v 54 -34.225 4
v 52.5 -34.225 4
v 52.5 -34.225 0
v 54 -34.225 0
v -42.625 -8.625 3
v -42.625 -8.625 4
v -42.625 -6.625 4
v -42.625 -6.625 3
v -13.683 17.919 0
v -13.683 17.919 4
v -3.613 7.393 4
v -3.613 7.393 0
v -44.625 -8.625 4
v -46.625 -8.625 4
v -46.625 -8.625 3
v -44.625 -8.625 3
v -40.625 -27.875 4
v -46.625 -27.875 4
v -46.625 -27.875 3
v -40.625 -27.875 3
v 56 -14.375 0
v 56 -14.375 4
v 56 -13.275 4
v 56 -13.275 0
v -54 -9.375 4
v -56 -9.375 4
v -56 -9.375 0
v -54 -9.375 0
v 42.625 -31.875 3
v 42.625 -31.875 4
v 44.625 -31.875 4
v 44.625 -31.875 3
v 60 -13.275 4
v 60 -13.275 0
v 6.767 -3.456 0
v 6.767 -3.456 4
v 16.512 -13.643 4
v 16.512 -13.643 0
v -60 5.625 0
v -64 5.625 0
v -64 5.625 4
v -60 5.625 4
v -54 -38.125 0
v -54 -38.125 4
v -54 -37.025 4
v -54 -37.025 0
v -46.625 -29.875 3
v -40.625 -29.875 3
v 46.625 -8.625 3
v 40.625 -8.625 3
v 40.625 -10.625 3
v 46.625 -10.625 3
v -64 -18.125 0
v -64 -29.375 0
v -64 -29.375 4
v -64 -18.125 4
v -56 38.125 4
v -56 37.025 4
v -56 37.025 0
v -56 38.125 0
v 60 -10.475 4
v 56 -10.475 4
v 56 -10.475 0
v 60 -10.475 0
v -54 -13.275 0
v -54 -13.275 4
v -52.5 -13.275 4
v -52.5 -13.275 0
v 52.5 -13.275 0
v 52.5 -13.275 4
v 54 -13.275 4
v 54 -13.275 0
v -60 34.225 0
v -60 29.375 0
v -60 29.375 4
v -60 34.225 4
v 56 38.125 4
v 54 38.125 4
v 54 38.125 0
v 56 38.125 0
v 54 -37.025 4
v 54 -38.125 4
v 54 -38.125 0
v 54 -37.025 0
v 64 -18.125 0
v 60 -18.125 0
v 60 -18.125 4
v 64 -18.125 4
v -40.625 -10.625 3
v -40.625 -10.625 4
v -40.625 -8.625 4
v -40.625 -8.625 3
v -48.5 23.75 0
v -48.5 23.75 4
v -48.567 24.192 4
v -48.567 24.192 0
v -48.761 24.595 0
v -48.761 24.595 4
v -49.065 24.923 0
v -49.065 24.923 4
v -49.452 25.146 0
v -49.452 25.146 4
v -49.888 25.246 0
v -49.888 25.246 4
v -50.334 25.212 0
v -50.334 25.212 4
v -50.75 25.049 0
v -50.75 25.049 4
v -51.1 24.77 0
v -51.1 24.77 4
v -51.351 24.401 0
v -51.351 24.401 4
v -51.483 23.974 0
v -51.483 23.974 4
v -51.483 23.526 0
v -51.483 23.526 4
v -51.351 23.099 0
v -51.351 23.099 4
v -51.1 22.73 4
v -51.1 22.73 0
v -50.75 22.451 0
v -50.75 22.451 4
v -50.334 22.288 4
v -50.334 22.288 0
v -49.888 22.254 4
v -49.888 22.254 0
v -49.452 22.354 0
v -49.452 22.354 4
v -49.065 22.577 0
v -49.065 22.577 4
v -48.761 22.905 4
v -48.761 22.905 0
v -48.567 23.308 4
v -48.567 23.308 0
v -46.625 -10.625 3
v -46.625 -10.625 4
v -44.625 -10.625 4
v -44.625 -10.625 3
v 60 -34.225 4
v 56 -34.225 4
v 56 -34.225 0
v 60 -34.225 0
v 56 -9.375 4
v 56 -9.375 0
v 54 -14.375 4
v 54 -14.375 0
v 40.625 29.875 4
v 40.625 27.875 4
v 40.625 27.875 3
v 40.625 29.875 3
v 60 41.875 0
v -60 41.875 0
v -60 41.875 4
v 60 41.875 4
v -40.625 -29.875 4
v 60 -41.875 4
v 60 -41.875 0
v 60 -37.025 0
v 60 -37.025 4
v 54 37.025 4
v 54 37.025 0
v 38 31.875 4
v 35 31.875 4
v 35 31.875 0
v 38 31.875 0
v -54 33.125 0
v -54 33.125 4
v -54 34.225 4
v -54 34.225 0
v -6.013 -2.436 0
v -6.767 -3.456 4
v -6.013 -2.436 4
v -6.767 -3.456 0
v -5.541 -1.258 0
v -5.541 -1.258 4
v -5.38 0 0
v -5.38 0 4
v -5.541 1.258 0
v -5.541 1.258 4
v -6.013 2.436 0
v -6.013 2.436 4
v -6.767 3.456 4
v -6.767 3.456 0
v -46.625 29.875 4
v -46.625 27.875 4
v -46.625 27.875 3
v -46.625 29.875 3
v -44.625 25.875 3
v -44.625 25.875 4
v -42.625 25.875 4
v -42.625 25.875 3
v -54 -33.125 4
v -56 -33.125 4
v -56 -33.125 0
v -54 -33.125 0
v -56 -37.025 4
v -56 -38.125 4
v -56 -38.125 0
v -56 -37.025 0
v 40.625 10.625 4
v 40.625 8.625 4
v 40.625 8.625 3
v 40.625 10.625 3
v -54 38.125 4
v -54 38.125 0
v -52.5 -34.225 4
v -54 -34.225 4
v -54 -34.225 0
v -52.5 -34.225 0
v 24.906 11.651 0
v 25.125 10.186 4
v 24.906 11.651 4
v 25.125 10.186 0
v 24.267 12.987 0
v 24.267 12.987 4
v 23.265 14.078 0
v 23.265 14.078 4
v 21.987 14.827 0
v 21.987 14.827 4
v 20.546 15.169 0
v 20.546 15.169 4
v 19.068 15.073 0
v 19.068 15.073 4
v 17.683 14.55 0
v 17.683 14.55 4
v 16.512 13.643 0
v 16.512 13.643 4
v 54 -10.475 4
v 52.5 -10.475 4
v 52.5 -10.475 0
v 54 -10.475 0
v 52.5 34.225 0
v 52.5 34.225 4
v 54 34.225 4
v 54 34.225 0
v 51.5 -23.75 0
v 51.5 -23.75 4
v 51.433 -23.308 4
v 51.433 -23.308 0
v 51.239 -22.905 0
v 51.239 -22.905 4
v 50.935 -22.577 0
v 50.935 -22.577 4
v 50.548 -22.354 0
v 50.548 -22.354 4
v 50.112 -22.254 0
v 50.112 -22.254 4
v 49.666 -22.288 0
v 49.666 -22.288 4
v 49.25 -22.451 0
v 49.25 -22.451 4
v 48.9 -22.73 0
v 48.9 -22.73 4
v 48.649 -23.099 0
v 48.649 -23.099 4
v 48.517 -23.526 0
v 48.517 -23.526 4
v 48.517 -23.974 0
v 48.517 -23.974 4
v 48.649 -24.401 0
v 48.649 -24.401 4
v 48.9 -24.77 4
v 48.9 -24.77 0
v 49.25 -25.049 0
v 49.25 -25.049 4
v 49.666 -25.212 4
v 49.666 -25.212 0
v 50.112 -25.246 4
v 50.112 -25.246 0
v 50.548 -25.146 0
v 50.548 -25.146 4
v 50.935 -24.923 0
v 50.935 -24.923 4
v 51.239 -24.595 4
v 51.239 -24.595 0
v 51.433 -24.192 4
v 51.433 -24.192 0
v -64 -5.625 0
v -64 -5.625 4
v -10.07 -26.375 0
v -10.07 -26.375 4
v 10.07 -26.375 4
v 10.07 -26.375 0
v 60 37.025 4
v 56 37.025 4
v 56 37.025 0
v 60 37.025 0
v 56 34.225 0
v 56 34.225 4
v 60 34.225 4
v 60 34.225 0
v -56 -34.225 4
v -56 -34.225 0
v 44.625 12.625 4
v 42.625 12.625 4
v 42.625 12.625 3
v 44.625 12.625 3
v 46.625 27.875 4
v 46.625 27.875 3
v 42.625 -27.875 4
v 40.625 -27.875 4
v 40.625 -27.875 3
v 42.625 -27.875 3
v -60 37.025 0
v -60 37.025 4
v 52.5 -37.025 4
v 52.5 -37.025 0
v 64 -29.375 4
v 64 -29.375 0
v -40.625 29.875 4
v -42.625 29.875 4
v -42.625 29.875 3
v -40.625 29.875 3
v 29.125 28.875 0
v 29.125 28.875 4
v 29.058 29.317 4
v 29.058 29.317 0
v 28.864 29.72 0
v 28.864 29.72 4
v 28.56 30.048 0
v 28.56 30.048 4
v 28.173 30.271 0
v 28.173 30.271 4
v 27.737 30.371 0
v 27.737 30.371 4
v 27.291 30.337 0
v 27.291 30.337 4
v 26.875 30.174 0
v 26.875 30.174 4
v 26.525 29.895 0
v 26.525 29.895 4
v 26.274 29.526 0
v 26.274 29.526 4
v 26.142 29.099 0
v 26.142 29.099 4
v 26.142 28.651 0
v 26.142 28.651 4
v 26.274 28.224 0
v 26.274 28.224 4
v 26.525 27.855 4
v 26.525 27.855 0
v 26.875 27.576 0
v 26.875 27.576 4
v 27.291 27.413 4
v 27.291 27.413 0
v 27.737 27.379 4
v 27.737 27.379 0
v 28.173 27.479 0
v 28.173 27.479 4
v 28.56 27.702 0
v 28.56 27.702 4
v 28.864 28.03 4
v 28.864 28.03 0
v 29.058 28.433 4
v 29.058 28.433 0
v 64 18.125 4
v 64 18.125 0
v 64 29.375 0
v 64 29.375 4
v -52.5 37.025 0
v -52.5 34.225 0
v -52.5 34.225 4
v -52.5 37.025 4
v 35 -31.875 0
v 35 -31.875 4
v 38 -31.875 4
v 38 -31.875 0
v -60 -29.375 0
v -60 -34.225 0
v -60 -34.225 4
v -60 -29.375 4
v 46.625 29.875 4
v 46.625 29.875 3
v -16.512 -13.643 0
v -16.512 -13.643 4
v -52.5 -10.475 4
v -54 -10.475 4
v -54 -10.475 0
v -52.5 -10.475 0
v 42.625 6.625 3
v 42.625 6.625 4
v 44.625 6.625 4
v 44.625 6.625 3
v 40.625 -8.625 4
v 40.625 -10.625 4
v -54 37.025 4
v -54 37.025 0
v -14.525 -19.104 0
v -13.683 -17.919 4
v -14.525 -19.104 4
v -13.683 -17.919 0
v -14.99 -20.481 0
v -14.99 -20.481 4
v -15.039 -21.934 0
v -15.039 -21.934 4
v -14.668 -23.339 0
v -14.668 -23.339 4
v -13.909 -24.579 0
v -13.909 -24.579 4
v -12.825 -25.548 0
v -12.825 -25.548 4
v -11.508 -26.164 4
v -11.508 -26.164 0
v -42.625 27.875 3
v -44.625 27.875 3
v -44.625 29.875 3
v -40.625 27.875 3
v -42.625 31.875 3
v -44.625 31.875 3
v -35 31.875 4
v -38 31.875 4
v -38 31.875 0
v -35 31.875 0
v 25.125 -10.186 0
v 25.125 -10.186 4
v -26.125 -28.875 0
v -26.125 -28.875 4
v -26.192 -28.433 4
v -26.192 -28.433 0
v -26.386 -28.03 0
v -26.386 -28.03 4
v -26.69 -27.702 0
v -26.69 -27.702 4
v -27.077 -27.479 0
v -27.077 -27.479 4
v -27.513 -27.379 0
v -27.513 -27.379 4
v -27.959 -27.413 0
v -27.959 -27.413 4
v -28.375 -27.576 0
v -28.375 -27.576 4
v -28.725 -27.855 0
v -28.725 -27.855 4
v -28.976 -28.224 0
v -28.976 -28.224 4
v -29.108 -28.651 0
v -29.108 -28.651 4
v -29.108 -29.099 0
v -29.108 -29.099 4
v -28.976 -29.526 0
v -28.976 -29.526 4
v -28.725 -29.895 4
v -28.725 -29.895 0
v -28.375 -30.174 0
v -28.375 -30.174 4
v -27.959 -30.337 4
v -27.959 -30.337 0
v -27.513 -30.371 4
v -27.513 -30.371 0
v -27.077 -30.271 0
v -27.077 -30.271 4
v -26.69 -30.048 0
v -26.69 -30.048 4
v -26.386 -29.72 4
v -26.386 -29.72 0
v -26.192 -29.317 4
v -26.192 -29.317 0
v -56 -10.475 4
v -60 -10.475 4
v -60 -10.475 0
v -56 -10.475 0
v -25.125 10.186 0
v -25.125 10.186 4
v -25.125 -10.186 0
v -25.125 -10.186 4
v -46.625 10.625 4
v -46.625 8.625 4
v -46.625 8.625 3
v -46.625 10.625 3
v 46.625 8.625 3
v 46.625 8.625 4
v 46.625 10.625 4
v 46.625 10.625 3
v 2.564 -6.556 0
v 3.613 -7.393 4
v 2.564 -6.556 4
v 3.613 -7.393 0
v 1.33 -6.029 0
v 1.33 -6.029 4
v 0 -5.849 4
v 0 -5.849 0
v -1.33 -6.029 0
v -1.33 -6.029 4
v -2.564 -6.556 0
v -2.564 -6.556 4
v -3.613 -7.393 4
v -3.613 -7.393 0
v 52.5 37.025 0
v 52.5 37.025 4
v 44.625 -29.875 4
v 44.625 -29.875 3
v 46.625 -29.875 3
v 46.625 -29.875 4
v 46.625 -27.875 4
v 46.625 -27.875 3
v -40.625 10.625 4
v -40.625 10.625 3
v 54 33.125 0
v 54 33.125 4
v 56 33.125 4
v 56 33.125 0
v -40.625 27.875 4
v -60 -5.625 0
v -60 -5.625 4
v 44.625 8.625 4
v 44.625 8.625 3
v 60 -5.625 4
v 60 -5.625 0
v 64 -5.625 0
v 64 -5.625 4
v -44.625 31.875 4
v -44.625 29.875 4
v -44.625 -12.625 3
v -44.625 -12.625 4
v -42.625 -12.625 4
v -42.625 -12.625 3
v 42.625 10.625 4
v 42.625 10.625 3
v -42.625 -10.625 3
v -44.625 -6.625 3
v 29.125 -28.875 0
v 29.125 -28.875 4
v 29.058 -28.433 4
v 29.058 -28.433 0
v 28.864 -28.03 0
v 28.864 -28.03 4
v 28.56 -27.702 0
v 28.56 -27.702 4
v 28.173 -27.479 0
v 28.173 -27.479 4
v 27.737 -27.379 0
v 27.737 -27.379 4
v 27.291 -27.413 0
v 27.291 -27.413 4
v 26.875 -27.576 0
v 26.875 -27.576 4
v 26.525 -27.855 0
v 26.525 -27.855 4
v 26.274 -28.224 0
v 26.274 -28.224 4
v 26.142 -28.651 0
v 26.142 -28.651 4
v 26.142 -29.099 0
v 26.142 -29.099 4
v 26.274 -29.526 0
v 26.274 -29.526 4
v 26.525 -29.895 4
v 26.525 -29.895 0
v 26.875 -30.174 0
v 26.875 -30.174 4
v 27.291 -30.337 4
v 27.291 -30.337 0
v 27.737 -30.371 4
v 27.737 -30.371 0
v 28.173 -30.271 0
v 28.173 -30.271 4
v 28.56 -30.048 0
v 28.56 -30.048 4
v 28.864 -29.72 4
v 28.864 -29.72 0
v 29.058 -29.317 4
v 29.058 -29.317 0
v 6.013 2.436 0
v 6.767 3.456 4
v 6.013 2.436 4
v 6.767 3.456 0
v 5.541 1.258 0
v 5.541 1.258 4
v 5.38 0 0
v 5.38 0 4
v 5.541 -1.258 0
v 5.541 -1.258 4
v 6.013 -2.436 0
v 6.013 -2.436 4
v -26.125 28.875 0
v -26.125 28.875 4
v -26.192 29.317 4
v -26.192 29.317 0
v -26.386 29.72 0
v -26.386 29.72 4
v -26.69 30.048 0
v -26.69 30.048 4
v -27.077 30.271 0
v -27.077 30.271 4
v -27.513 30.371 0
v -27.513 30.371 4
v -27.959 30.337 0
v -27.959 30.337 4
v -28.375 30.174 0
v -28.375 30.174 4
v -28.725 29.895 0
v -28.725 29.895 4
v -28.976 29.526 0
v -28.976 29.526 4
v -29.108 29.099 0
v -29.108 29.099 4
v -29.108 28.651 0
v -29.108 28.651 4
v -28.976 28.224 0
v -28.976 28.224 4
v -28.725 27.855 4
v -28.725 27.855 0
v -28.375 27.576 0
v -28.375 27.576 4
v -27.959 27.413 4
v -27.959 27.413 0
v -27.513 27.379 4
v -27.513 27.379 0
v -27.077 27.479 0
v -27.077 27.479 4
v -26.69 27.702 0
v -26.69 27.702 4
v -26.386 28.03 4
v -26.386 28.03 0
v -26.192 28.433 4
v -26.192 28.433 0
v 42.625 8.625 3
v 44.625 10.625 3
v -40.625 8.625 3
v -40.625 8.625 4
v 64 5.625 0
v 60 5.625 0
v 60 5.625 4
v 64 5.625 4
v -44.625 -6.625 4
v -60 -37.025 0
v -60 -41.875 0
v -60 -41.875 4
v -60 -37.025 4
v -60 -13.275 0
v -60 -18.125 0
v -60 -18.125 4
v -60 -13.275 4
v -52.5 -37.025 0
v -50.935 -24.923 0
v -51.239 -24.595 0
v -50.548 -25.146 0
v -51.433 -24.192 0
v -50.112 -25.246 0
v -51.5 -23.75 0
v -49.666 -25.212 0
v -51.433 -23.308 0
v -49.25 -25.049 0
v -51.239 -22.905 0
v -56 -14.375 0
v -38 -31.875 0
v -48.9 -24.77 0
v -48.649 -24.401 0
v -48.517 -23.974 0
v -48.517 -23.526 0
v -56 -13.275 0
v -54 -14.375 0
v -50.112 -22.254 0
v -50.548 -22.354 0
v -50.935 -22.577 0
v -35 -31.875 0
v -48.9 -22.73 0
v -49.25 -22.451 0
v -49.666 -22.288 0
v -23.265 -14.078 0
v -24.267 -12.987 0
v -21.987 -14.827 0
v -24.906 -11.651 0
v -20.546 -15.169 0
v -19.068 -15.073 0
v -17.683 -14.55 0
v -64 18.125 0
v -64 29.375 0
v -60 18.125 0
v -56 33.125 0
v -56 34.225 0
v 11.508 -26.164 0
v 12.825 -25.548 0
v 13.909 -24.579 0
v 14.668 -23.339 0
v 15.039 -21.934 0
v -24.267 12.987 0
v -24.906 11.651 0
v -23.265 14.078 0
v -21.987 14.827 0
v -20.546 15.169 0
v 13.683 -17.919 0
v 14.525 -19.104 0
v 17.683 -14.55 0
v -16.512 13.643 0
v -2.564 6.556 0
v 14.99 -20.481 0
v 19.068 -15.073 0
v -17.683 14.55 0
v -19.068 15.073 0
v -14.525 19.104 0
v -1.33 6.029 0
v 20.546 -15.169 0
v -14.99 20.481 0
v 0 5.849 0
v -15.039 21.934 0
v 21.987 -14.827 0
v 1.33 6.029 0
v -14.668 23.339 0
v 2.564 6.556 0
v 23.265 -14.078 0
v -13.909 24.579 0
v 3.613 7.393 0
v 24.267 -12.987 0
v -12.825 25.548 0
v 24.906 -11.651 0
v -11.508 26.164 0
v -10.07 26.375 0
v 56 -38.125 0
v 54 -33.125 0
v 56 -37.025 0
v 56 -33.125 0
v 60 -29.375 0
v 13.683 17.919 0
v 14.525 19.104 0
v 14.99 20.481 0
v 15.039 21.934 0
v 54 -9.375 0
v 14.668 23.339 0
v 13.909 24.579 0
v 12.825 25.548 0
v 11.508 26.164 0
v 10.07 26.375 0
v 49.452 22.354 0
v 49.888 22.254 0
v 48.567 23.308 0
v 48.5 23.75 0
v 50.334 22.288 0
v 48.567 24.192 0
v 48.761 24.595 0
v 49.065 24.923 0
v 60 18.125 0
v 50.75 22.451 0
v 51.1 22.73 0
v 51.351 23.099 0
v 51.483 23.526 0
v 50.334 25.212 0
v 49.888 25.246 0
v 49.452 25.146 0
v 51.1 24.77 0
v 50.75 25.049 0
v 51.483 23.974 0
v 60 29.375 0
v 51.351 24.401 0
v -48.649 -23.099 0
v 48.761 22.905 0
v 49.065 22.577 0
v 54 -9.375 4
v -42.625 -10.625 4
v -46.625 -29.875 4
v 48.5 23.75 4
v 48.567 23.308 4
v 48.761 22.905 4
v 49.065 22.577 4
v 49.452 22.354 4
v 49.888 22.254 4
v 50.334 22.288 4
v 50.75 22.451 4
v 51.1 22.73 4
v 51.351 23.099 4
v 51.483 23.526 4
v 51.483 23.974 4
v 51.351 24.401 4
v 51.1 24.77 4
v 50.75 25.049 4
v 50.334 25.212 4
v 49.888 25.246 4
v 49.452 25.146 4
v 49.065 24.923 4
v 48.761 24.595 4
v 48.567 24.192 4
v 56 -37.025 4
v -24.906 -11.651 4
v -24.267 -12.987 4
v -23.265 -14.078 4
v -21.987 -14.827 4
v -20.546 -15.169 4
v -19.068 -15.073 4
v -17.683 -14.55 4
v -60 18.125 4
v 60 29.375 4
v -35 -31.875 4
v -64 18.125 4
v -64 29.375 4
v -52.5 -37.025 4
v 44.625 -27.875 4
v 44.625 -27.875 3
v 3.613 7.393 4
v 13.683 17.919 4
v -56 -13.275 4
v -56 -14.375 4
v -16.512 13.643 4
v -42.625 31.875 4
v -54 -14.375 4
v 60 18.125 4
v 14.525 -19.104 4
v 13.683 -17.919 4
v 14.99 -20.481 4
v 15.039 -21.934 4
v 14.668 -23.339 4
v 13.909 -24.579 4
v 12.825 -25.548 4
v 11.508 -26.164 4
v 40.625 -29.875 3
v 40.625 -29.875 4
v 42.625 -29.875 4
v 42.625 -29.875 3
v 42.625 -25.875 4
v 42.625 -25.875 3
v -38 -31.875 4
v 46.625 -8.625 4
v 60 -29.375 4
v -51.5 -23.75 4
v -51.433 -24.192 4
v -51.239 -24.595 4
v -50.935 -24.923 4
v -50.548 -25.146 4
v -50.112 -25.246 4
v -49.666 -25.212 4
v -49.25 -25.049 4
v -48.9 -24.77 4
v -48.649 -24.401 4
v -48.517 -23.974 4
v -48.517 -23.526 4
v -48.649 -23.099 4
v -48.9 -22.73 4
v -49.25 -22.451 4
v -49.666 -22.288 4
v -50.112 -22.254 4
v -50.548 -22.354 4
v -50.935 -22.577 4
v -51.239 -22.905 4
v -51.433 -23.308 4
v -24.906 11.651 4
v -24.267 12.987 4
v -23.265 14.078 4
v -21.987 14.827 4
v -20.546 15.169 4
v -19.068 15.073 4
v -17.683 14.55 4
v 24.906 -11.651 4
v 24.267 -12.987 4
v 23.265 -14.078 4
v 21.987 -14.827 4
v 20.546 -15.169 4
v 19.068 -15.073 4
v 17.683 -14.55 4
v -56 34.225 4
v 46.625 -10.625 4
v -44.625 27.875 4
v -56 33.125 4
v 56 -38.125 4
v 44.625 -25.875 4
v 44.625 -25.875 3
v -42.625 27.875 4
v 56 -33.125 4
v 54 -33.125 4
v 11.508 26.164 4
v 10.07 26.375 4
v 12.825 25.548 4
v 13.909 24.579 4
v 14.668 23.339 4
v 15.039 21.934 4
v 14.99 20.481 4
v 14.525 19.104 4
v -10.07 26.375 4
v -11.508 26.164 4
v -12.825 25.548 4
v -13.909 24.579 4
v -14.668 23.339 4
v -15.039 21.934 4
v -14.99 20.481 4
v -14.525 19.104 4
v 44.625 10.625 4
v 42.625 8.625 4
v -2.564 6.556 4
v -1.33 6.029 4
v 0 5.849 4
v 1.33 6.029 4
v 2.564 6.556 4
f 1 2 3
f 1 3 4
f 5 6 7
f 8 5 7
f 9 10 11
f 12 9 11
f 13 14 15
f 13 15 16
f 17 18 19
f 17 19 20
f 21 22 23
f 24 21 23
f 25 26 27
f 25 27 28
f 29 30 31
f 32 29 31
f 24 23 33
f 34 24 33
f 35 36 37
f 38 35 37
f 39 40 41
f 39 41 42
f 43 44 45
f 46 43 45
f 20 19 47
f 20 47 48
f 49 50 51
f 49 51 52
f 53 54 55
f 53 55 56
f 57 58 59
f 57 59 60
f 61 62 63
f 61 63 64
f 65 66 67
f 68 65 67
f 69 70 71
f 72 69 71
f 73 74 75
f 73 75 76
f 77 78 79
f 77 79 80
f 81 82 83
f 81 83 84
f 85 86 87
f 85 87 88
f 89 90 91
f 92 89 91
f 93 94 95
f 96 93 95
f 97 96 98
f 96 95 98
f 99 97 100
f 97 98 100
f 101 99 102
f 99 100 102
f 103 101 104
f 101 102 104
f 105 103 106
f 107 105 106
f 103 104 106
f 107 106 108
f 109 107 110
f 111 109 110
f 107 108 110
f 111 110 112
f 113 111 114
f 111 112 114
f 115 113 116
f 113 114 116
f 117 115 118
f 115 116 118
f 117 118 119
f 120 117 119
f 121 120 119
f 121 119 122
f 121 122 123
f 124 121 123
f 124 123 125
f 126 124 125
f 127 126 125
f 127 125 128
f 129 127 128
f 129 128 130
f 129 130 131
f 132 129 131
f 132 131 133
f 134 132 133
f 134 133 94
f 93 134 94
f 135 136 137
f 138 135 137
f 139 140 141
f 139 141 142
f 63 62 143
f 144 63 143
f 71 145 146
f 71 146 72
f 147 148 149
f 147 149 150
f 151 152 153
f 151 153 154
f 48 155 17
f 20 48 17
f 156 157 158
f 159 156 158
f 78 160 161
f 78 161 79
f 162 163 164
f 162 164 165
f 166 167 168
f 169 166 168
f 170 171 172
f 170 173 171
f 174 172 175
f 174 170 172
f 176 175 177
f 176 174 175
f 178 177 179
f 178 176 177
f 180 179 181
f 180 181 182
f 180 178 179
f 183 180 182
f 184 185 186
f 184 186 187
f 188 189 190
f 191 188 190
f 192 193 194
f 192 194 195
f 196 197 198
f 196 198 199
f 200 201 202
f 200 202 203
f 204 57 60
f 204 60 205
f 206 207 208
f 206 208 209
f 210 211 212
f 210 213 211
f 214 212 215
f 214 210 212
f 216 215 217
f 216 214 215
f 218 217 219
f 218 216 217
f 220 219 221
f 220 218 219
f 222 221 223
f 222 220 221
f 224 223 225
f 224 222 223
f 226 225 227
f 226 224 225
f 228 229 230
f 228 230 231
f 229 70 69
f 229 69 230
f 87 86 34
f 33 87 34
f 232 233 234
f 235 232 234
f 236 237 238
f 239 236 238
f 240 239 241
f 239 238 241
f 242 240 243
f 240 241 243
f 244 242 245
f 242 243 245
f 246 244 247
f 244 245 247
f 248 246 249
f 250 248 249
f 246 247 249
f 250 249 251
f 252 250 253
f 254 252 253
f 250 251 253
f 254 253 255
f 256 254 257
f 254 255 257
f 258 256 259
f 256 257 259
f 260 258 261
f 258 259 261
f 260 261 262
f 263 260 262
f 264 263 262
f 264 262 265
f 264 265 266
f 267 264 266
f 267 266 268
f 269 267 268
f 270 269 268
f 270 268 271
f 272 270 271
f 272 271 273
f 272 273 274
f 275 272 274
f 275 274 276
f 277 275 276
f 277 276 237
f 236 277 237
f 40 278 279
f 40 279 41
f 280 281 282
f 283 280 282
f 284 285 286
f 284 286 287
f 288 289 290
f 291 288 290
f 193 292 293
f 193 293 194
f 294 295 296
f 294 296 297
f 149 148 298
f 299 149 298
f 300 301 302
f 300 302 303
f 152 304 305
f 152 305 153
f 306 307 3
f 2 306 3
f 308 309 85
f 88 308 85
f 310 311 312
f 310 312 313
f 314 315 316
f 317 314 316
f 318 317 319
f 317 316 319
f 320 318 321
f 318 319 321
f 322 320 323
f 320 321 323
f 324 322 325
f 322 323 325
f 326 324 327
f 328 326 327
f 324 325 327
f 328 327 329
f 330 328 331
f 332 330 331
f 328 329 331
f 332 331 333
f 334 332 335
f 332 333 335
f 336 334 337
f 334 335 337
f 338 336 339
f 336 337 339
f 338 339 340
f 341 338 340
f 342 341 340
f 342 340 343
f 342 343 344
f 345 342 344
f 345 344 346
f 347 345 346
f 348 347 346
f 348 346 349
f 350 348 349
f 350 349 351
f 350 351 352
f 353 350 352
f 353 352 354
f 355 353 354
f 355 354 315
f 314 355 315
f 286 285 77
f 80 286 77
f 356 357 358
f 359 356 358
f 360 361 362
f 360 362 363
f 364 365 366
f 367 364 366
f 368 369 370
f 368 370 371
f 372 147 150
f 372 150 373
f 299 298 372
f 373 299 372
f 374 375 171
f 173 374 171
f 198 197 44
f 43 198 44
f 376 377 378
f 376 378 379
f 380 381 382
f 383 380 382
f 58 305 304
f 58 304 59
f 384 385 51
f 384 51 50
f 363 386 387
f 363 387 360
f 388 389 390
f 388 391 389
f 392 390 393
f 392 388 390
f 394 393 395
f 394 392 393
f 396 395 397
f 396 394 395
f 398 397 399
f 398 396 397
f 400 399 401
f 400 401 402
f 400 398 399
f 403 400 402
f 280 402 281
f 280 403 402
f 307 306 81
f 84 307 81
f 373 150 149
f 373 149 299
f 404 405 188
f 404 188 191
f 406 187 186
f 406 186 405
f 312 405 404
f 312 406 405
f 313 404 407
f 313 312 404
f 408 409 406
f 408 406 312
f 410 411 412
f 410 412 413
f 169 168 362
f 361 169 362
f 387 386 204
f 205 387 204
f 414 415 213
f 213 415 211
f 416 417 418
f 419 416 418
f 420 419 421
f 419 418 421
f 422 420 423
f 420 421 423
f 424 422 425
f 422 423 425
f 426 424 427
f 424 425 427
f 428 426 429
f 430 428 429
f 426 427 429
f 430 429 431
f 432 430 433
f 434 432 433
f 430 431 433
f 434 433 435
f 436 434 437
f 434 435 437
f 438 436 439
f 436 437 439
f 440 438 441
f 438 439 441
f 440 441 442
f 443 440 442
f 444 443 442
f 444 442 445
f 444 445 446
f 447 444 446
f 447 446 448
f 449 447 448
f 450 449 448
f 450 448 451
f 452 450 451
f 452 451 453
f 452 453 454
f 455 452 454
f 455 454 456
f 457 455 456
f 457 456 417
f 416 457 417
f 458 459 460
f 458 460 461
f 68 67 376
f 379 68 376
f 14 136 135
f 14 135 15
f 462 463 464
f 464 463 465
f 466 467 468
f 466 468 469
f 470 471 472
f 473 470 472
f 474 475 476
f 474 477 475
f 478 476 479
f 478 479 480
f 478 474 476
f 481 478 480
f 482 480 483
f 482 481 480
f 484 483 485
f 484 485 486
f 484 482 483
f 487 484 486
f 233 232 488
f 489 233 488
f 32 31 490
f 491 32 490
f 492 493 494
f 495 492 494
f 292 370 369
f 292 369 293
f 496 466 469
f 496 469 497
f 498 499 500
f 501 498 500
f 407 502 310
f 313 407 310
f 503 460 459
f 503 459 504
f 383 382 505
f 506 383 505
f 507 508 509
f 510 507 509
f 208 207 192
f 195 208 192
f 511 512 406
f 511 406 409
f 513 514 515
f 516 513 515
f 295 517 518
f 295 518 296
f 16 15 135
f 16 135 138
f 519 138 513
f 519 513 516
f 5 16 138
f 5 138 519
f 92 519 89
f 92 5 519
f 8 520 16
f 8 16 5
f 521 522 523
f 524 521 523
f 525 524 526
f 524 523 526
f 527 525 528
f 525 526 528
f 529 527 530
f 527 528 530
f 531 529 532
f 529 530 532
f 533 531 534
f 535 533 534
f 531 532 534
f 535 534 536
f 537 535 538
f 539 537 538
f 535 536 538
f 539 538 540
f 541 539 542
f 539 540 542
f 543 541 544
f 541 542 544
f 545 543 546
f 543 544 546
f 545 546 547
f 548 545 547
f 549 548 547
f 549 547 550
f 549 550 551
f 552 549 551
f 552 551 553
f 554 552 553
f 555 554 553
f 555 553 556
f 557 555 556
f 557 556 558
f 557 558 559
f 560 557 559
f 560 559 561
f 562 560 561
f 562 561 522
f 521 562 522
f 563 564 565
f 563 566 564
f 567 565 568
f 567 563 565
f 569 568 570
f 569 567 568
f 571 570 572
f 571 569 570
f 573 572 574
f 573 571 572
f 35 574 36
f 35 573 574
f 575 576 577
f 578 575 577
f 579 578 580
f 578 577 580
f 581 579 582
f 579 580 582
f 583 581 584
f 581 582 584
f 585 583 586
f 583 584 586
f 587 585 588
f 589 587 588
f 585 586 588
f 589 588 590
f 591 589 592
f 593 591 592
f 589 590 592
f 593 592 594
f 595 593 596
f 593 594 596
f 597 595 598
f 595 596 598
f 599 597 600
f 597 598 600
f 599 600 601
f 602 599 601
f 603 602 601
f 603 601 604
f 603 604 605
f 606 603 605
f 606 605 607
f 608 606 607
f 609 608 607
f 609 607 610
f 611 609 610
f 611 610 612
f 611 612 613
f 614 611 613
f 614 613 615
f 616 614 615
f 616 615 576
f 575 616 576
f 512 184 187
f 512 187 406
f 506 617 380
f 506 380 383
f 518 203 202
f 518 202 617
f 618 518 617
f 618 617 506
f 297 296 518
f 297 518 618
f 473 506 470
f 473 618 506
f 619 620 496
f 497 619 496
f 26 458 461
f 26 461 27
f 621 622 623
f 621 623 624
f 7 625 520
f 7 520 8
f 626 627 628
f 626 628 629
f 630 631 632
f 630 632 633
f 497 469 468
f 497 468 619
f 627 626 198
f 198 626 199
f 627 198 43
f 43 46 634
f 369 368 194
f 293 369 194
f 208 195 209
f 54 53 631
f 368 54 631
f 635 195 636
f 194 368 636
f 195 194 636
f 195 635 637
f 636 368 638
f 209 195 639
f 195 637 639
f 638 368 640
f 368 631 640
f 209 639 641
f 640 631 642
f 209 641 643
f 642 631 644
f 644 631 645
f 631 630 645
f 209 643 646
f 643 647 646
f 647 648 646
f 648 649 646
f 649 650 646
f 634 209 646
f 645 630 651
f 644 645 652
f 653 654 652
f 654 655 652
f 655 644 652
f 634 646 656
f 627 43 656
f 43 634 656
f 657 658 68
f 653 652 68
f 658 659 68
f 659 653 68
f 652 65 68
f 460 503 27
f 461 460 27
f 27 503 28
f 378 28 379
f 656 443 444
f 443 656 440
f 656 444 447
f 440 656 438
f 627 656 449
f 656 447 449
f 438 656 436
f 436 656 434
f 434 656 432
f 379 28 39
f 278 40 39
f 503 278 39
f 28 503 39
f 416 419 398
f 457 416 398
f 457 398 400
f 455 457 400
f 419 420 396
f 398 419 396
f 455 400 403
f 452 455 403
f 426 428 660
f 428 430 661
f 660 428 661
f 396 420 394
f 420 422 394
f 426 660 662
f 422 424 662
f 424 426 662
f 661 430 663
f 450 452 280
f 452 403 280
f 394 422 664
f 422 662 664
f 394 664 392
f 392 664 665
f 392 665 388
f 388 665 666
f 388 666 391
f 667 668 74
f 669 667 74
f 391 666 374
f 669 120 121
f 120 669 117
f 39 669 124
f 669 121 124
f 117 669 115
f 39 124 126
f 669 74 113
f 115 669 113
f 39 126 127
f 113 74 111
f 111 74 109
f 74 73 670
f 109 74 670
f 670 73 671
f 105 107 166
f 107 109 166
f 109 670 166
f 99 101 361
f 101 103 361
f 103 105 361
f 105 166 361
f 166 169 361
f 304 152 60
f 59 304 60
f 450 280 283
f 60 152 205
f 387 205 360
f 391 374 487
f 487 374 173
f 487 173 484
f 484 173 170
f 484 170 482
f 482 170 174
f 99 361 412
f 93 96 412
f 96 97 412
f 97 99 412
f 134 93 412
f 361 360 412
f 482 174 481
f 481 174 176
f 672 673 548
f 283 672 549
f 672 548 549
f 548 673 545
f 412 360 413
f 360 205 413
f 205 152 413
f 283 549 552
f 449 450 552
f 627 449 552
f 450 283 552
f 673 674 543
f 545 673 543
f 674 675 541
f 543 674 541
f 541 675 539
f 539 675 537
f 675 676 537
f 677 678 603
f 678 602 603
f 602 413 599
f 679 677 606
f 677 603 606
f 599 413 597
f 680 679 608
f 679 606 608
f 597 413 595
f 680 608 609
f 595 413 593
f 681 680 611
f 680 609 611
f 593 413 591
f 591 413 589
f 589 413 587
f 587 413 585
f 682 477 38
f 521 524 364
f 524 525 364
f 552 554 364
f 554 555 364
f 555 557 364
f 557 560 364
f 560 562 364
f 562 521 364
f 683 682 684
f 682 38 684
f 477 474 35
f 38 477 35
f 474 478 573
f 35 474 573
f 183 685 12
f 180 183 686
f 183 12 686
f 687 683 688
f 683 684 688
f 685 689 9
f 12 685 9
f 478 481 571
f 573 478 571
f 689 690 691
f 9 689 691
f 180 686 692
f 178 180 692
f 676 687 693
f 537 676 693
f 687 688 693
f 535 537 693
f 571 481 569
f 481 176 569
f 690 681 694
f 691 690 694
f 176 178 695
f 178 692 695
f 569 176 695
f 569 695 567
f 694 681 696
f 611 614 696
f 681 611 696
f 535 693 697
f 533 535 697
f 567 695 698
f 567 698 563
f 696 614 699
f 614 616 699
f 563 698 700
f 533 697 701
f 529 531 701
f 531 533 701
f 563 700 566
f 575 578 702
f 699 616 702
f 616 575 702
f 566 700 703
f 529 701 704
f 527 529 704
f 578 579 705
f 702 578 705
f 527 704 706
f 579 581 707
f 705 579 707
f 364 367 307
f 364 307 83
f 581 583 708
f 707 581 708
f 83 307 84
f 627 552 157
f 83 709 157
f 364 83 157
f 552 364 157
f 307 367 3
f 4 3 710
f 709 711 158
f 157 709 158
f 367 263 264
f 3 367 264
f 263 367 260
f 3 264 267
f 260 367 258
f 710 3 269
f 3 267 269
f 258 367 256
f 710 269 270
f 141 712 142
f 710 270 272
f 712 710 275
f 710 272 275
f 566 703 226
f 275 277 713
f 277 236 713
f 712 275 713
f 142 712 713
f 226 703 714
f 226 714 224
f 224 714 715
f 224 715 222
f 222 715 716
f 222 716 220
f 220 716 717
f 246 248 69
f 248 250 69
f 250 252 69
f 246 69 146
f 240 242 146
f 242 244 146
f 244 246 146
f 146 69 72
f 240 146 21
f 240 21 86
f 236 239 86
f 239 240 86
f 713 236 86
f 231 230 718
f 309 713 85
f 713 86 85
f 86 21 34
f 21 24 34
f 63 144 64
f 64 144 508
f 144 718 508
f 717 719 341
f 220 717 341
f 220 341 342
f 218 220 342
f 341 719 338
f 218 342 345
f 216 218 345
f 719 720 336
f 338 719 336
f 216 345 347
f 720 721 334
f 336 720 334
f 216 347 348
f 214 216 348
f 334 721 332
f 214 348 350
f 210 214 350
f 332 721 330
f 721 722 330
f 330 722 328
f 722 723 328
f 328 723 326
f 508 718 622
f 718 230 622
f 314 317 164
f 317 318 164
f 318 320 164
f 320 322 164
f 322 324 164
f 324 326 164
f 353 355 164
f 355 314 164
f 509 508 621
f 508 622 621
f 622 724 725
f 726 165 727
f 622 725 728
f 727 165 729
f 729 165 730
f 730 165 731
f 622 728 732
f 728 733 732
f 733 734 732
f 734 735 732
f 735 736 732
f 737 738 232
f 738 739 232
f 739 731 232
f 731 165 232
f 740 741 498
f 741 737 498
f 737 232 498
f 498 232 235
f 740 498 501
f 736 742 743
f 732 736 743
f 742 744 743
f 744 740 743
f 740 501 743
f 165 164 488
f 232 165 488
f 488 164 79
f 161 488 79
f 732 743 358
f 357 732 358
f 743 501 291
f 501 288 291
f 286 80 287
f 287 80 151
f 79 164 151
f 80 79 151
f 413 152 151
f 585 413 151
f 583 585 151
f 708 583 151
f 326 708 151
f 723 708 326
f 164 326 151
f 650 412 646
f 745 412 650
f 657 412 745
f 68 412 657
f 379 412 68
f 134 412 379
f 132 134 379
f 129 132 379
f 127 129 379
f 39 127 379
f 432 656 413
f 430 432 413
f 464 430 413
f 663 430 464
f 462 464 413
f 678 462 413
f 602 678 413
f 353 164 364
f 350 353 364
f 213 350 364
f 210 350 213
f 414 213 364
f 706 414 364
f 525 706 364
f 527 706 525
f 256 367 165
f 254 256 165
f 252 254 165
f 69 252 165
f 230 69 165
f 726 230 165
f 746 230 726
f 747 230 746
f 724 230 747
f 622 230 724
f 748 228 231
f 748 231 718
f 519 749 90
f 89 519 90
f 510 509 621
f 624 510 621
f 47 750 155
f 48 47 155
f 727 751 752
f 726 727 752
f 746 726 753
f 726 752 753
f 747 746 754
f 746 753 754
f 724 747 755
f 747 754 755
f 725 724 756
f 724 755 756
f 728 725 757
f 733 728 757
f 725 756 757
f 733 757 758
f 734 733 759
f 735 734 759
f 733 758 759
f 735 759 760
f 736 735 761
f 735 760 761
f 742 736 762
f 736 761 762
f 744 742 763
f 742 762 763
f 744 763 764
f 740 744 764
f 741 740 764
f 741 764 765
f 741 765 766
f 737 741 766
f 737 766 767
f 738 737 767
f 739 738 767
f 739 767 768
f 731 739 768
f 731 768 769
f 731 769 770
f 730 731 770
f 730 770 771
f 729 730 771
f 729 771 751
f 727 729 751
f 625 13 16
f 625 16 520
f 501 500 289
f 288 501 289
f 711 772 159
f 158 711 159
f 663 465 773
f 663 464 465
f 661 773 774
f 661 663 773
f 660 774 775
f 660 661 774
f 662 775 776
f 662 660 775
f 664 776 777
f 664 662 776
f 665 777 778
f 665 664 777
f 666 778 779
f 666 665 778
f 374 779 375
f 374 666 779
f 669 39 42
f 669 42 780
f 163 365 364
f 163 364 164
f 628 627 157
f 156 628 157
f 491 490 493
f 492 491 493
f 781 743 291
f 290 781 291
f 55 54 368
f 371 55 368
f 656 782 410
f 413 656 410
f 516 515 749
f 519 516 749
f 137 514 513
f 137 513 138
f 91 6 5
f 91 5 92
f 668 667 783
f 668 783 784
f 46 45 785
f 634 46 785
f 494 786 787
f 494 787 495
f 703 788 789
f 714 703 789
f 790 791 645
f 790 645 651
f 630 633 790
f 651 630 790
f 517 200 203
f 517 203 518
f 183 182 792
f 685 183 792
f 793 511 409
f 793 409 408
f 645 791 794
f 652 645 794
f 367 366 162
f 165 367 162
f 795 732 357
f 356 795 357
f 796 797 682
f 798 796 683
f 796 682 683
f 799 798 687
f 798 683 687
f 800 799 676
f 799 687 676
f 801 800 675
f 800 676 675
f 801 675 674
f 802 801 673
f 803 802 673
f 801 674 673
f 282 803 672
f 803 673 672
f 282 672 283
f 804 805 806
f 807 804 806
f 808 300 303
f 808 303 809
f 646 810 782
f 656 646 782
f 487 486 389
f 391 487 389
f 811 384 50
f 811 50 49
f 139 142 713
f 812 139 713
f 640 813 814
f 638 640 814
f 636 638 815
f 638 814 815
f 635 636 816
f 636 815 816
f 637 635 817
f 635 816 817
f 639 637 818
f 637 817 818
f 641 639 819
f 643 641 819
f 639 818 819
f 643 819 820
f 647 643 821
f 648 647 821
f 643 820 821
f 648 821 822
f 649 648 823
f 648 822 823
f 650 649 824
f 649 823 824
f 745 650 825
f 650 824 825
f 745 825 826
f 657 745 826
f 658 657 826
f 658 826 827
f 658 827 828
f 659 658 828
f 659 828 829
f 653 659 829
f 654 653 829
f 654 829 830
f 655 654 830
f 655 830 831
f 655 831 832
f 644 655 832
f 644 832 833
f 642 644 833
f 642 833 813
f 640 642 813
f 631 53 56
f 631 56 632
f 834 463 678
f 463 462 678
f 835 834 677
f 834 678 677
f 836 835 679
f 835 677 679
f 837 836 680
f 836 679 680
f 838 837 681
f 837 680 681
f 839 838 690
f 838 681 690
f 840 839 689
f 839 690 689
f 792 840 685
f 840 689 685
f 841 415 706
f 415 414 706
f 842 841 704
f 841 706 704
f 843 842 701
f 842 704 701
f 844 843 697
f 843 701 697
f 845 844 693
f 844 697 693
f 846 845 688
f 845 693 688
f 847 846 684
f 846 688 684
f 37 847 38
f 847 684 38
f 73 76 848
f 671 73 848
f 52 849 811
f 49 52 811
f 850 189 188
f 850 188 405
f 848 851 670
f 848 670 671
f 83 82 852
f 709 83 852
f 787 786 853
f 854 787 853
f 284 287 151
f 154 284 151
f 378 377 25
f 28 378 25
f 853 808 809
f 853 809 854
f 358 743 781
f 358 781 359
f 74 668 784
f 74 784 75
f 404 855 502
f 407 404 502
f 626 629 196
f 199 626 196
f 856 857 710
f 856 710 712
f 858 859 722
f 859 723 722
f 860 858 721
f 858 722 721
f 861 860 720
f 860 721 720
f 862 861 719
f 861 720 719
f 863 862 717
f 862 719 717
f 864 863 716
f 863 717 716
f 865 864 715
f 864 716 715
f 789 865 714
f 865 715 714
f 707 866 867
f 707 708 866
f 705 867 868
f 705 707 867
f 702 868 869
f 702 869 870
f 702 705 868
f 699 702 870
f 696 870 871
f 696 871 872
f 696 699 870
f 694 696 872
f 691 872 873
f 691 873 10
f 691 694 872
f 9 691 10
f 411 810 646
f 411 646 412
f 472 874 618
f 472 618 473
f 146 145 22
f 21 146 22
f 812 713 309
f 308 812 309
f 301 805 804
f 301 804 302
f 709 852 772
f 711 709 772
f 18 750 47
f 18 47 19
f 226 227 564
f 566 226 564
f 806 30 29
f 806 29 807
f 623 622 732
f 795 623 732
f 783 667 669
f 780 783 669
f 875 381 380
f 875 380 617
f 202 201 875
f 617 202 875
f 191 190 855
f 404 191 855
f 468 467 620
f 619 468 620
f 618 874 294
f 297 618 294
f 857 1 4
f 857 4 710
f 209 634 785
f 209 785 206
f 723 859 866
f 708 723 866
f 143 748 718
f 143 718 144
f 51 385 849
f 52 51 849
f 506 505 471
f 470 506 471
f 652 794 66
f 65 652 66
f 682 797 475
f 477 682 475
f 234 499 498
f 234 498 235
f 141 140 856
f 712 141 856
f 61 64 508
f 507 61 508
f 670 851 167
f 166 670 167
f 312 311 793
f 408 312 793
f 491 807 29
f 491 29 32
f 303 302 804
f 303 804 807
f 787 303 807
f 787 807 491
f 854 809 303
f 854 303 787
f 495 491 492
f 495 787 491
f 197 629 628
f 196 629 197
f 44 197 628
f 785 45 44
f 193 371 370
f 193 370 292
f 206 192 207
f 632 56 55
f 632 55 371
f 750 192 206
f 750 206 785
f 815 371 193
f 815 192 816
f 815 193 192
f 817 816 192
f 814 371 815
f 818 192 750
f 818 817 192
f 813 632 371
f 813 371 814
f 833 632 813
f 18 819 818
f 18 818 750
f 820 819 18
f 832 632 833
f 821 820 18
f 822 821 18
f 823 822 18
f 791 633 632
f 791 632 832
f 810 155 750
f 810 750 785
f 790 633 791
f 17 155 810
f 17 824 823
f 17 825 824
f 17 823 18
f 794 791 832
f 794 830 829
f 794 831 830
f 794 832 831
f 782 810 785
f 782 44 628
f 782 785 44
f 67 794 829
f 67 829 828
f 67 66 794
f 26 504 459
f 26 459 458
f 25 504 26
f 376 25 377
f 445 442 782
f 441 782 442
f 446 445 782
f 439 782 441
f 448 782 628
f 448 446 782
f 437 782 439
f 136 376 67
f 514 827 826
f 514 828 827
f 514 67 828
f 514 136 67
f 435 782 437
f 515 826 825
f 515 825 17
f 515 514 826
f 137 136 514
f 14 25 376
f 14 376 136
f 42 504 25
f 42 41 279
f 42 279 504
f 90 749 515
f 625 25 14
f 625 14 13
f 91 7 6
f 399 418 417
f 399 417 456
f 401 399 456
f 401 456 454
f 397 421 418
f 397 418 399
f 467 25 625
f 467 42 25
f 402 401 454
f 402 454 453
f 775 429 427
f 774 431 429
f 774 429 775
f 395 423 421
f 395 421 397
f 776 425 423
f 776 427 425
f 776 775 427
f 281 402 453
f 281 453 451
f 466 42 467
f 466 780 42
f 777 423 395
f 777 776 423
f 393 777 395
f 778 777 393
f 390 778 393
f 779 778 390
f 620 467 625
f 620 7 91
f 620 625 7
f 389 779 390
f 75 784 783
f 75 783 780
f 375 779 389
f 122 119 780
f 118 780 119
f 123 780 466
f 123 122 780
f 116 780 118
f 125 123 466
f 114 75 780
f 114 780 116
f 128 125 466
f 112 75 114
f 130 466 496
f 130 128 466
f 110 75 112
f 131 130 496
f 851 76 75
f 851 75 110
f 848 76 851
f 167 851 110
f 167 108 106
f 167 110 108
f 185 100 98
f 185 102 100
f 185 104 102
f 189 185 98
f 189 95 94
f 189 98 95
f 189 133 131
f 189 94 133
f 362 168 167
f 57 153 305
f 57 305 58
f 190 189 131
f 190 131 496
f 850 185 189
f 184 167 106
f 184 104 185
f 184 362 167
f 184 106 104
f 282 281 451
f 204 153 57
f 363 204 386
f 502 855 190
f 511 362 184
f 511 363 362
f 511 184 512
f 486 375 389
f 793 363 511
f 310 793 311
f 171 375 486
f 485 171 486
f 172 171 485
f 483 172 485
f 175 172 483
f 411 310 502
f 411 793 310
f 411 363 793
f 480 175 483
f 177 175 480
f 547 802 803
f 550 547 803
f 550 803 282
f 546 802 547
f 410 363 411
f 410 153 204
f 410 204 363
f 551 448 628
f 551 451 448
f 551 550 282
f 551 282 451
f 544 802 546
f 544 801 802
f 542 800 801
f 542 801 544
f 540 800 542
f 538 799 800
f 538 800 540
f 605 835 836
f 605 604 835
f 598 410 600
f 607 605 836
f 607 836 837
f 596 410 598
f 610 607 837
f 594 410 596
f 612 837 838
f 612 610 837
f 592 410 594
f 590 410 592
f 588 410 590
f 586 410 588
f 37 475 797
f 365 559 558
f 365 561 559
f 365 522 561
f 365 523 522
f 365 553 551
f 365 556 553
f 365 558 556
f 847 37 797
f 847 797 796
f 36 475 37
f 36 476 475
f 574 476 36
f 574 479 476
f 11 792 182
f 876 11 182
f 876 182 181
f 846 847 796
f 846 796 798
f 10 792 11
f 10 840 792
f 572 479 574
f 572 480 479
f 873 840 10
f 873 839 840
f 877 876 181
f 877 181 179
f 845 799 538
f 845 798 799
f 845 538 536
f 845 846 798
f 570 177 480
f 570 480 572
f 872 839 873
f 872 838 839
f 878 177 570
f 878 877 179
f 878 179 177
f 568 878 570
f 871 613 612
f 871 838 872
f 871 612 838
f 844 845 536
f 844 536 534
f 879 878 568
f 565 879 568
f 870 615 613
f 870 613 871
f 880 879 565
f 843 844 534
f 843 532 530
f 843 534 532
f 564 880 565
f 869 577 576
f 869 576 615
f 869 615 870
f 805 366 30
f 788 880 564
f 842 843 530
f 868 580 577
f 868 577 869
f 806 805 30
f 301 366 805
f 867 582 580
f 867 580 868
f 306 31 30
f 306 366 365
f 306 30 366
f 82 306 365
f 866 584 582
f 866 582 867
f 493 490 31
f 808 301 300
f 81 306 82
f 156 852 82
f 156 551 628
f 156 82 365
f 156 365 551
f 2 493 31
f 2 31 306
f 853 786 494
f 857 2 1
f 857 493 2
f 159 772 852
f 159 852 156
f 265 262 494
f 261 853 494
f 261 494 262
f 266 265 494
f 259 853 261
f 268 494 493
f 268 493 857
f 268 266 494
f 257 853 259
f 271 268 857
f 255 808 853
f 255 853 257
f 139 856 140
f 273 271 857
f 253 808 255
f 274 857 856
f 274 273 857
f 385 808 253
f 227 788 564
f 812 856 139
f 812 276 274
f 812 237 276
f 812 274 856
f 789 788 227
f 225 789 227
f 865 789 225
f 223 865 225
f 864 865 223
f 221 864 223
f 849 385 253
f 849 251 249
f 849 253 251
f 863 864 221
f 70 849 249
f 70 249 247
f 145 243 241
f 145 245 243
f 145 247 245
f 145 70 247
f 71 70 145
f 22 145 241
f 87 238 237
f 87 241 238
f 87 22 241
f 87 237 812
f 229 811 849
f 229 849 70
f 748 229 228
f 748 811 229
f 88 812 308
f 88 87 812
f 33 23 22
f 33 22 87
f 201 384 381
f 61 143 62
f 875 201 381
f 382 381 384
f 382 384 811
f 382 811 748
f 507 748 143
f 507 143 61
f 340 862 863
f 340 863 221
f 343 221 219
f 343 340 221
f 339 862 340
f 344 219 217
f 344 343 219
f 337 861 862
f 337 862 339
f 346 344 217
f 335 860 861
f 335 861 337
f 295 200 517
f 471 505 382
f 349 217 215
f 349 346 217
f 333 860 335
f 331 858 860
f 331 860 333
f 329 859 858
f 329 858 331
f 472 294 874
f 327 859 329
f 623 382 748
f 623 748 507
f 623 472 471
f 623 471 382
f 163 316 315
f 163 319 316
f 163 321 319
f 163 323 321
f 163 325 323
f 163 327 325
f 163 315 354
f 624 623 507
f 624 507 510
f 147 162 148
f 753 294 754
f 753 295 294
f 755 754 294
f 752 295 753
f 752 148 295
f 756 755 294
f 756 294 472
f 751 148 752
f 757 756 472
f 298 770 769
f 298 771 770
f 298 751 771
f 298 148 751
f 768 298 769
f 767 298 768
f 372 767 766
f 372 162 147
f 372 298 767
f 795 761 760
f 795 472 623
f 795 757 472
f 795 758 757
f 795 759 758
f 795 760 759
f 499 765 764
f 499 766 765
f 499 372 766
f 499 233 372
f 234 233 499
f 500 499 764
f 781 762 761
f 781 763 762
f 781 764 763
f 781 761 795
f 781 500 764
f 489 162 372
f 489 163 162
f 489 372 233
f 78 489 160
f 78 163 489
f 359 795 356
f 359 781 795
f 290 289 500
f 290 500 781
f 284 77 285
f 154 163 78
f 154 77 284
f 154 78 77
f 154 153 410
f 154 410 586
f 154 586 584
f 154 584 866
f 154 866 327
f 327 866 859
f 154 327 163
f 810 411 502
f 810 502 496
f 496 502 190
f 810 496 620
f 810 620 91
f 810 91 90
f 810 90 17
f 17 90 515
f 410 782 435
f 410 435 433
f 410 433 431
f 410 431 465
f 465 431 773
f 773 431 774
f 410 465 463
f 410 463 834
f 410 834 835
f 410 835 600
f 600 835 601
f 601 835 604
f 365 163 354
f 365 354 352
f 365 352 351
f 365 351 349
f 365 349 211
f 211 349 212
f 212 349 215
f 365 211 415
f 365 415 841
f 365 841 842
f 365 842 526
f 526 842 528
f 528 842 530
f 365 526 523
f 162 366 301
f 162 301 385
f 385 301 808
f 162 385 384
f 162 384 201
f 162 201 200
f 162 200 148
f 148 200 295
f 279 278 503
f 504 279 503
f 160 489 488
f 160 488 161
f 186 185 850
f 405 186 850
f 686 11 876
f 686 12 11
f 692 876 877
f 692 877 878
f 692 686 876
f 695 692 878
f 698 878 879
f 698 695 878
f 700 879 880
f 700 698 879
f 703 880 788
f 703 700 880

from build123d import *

# Parameters (mm, degrees)
SKETCH_1_W          = 120
SKETCH_1_H          = 83.75
SKETCH_1_W_2        = 4
SKETCH_1_H_2        = 11.25
EXTRUDE_1_DEPTH     = 4
SKETCH_2_W          = 7.5
SKETCH_2_H          = 2.8
SKETCH_2_W_2        = 2
SKETCH_2_H_2        = 5
CUT_EXTRUDE_1_DEPTH = 4
SKETCH_3_W          = 3
SKETCH_3_H          = 63.75
SKETCH_3_R          = 1.5
CUT_EXTRUDE_2_DEPTH = 77.586654353
FILLET_1_R          = 5
SKETCH_4_W          = 6
SKETCH_4_H          = 2
SKETCH_4_W_2        = 2
SKETCH_4_H_2        = 6
CUT_EXTRUDE_3_DEPTH = 1


with BuildPart() as part:
    # Эскиз1 → Бобышка-Вытянуть1 (new body)
    with BuildSketch(Plane.XY):
        Rectangle(SKETCH_1_W, SKETCH_1_H)
        with Locations((-62, -23.75)):
            Rectangle(SKETCH_1_W_2, SKETCH_1_H_2)
        with Locations((-62, 23.75)):
            Rectangle(SKETCH_1_W_2, SKETCH_1_H_2)
        with Locations((62, 23.75)):
            Rectangle(SKETCH_1_W_2, SKETCH_1_H_2)
        with Locations((62, -23.75)):
            Rectangle(SKETCH_1_W_2, SKETCH_1_H_2)
        with Locations((-62, 0)):
            Rectangle(SKETCH_1_W_2, SKETCH_1_H_2)
        with Locations((62, 0)):
            Rectangle(SKETCH_1_W_2, SKETCH_1_H_2)
    extrude(amount=EXTRUDE_1_DEPTH)

    # Эскиз2 → Вырез-Вытянуть1 (cut)
    with BuildSketch(Plane.XY.offset(4)):
        with Locations((-56.25, 35.625)):
            Rectangle(SKETCH_2_W, SKETCH_2_H)
        with Locations((-55, 35.625)):
            Rectangle(SKETCH_2_W_2, SKETCH_2_H_2)
        with Locations((-55, -35.625)):
            Rectangle(SKETCH_2_W_2, SKETCH_2_H_2)
        with Locations((-56.25, -35.625)):
            Rectangle(SKETCH_2_W, SKETCH_2_H)
        with Locations((-56.25, -11.875)):
            Rectangle(SKETCH_2_W, SKETCH_2_H)
        with Locations((-55, -11.875)):
            Rectangle(SKETCH_2_W_2, SKETCH_2_H_2)
        with Locations((55, -11.875)):
            Rectangle(SKETCH_2_W_2, SKETCH_2_H_2)
        with Locations((56.25, -11.875)):
            Rectangle(SKETCH_2_W, SKETCH_2_H)
        with Locations((56.25, -35.625)):
            Rectangle(SKETCH_2_W, SKETCH_2_H)
        with Locations((55, -35.625)):
            Rectangle(SKETCH_2_W_2, SKETCH_2_H_2)
        with Locations((55, 35.625)):
            Rectangle(SKETCH_2_W_2, SKETCH_2_H_2)
        with Locations((56.25, 35.625)):
            Rectangle(SKETCH_2_W, SKETCH_2_H)
    extrude(amount=-CUT_EXTRUDE_1_DEPTH, mode=Mode.SUBTRACT)

    # Эскиз3 → Вырез-Вытянуть2 (cut, through all)
    with BuildSketch(Plane.XY.offset(4)):
        with Locations((-36.5, 0)):
            Rectangle(SKETCH_3_W, SKETCH_3_H)
        with Locations((36.5, 0)):
            Rectangle(SKETCH_3_W, SKETCH_3_H)
        Polygon((-25.125, 22.645469736), (-25.125, -22.645469736), (-3.459853629, 0), align=None)
        Polygon((21.773371479, 26.375), (-21.773371479, 26.375), (0, 3.616408092), align=None)
        Polygon((21.773371479, -26.375), (0, -3.616408092), (-21.773371479, -26.375), align=None)
        Polygon((25.125, -22.645469736), (25.125, 22.645469736), (3.459853629, 0), align=None)
        with Locations((-27.625, 28.875)):
            Circle(SKETCH_3_R)
        with Locations((27.625, 28.875)):
            Circle(SKETCH_3_R)
        with Locations((27.625, -28.875)):
            Circle(SKETCH_3_R)
        with Locations((-27.625, -28.875)):
            Circle(SKETCH_3_R)
        with Locations((50, -23.75)):
            Circle(SKETCH_3_R)
        with Locations(Location((50, 23.75, 0), (0, 0, 180))):
            Circle(SKETCH_3_R)
        with Locations((-50, 23.75)):
            Circle(SKETCH_3_R)
        with Locations(Location((-50, -23.75, 0), (0, 0, 180))):
            Circle(SKETCH_3_R)
    extrude(amount=-CUT_EXTRUDE_2_DEPTH, mode=Mode.SUBTRACT)

    # Скругление1
    fillet_1_edges = [part.edges().sort_by_distance(p)[0] for p in [
        (-21.773371479, -26.375, 2),
        (0, -3.616408092, 2),
        (21.773371479, -26.375, 2),
        (-3.459853629, 0, 2),
        (-25.125, -22.645469736, 2),
        (-25.125, 22.645469736, 2),
        (25.125, -22.645469736, 2),
        (3.459853629, 0, 2),
        (25.125, 22.645469736, 2),
        (0, 3.616408092, 2),
        (-21.773371479, 26.375, 2),
        (21.773371479, 26.375, 2),
    ]]
    fillet(fillet_1_edges, radius=FILLET_1_R)

    # Эскиз4 → Вырез-Вытянуть3 (cut)
    with BuildSketch(Plane.XY.offset(4)):
        with Locations((-43.625, 9.625)):
            Rectangle(SKETCH_4_W, SKETCH_4_H)
        with Locations((-43.625, 28.875)):
            Rectangle(SKETCH_4_W, SKETCH_4_H)
        with Locations((-43.625, 28.875)):
            Rectangle(SKETCH_4_W_2, SKETCH_4_H_2)
        with Locations((-43.625, -9.625)):
            Rectangle(SKETCH_4_W, SKETCH_4_H)
        with Locations((-43.625, -9.625)):
            Rectangle(SKETCH_4_W_2, SKETCH_4_H_2)
        with Locations((-43.625, -28.875)):
            Rectangle(SKETCH_4_W, SKETCH_4_H)
        with Locations((43.625, -28.875)):
            Rectangle(SKETCH_4_W_2, SKETCH_4_H_2)
        with Locations((43.625, -28.875)):
            Rectangle(SKETCH_4_W, SKETCH_4_H)
        with Locations((43.625, -9.625)):
            Rectangle(SKETCH_4_W, SKETCH_4_H)
        with Locations((43.625, 9.625)):
            Rectangle(SKETCH_4_W_2, SKETCH_4_H_2)
        with Locations((43.625, 9.625)):
            Rectangle(SKETCH_4_W, SKETCH_4_H)
        with Locations((43.625, 28.875)):
            Rectangle(SKETCH_4_W, SKETCH_4_H)
    extrude(amount=-CUT_EXTRUDE_3_DEPTH, mode=Mode.SUBTRACT)


solid = part.part
